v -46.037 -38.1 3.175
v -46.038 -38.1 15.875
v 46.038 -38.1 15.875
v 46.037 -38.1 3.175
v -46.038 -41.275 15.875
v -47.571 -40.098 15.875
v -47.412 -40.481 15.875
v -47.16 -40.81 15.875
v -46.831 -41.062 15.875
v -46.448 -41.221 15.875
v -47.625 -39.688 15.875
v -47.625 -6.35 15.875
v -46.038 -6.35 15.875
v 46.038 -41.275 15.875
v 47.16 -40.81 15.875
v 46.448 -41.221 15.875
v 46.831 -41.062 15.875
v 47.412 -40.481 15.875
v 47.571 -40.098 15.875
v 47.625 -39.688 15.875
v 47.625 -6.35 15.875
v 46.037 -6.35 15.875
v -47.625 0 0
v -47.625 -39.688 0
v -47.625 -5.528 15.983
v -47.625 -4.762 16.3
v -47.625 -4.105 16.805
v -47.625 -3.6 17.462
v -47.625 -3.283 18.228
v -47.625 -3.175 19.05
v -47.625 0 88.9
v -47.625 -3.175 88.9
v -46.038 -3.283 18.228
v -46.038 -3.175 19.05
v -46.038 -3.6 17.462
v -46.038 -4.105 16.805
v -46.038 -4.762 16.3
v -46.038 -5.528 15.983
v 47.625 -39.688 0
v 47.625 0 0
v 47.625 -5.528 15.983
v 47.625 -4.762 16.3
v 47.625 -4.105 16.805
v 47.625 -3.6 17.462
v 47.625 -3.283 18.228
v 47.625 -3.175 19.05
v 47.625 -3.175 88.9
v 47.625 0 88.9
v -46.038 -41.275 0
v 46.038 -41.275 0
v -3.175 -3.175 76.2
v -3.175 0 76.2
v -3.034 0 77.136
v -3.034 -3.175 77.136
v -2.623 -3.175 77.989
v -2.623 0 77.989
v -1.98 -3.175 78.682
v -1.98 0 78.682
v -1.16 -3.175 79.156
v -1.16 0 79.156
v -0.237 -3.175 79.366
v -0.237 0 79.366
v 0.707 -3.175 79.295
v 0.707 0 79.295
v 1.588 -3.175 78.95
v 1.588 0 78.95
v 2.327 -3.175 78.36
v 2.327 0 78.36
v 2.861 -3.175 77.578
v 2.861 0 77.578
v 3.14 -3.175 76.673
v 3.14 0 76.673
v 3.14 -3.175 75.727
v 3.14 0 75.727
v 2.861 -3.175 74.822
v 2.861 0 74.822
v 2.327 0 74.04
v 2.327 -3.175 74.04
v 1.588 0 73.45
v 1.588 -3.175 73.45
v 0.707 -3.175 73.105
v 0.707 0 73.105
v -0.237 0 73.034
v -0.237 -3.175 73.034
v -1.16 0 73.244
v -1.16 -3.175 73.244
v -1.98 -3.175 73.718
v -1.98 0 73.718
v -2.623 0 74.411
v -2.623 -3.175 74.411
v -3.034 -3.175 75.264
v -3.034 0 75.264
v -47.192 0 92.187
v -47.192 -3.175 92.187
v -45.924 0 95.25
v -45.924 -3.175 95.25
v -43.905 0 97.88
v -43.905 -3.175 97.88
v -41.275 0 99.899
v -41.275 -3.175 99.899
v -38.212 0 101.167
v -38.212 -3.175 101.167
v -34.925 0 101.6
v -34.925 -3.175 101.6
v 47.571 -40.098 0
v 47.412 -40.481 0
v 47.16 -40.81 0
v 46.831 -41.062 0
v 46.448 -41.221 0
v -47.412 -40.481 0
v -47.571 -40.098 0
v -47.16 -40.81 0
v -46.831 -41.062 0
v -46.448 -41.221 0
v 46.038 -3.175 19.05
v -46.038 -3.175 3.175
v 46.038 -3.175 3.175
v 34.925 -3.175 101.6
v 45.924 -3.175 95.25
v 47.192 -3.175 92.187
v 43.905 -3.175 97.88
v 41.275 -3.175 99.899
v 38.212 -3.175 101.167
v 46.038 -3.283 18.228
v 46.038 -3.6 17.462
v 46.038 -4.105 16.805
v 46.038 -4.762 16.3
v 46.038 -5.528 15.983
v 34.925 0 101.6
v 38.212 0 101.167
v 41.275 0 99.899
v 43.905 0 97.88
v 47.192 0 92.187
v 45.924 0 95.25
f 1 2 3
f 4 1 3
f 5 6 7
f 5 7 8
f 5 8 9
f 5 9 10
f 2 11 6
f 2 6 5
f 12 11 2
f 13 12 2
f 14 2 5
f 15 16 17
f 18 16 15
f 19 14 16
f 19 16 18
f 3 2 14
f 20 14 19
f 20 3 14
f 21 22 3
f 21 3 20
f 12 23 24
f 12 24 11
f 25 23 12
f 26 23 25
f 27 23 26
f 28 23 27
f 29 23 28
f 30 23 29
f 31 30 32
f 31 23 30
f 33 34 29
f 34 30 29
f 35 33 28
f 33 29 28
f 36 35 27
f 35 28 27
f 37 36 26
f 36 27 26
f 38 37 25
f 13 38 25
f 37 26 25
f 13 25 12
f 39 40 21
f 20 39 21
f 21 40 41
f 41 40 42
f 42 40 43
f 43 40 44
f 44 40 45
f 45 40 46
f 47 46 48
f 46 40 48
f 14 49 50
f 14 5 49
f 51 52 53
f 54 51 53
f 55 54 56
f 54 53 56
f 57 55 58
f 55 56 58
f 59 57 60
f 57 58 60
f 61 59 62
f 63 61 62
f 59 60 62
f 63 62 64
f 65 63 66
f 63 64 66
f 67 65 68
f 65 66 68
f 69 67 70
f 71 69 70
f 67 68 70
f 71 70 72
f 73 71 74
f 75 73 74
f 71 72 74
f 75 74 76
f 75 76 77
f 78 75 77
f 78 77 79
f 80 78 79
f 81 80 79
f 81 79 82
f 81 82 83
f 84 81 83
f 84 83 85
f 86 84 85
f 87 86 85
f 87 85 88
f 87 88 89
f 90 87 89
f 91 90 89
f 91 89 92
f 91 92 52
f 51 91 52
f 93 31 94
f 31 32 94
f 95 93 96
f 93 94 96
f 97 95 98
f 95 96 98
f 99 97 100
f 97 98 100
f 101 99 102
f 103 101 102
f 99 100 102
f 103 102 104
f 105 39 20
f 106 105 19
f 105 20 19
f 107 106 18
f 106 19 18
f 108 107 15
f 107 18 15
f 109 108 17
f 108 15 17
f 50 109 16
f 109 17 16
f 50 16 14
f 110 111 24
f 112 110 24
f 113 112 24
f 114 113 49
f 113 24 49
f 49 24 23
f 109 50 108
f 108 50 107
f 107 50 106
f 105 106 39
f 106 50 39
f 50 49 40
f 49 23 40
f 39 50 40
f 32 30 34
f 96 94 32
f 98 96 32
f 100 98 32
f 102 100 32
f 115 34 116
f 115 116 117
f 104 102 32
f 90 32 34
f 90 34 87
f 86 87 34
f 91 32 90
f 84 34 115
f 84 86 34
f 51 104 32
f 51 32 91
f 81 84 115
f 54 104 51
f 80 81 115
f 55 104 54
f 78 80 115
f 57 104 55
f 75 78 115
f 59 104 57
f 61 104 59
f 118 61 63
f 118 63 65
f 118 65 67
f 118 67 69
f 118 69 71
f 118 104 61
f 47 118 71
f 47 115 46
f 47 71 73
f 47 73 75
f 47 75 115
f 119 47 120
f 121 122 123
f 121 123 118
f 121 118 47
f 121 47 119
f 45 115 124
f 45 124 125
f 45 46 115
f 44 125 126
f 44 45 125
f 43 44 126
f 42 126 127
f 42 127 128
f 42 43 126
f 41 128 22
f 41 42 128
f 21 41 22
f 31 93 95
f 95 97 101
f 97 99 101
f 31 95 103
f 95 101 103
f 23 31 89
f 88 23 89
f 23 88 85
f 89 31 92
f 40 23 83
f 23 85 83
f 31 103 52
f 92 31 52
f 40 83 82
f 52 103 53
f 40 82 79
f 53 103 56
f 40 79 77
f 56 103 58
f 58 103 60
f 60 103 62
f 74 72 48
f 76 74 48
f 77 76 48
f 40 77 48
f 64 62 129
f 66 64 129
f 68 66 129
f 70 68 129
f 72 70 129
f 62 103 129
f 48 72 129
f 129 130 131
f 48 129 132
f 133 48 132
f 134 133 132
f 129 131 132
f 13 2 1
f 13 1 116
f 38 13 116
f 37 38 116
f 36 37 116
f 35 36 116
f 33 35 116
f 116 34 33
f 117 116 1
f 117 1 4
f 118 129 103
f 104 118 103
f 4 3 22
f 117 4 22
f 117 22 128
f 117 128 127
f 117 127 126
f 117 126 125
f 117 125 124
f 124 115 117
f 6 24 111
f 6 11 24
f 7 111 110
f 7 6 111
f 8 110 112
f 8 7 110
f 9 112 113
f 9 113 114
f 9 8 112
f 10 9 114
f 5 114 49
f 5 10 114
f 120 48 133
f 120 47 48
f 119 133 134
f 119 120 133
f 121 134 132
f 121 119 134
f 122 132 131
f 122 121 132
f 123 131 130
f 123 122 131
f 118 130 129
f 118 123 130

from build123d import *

# Parameters (mm, degrees)
F1_DEPTH = 3.175
F3_DEPTH = 3.175
F4_W     = 38.1
F4_H     = 15.875
F5_DEPTH = 1.5875
F7_W     = 95.25
F7_H     = 15.875
F8_DEPTH = 3.175
F9_R     = 12.7
F11_D    = 6.35
F12_R    = 3.175
F13_R    = 1.5875


with BuildPart() as f1:
    # F0 (on Front) → F1 (new body)
    with BuildSketch(Plane.XZ):
        Polygon((-47.625, 0), (0, 0), (47.625, 0), (47.625, 101.6), (0, 101.6), (-47.625, 101.6), align=None)
    extrude(amount=F1_DEPTH)

    # F2 (on Top) → F3 (join)
    with BuildSketch(Plane.XY):
        Polygon((47.625, 0), (0, 0), (-47.625, 0), (-47.625, -38.1), (0, -38.1), (47.625, -38.1), align=None)
    extrude(amount=F3_DEPTH)

    # F4 (on face) → F5 (join)
    with BuildSketch(Plane.YZ.offset(47.625)):
        with Locations((-19.05, 7.9375)):
            Rectangle(F4_W, F4_H)
    extrude(amount=-F5_DEPTH)

    # F6: F1 across plane


with BuildPart() as f1_1:
    add(f1.part)
    add(f1.part.mirror(Plane.YZ))

    # F7 (on face) → F8 (join)
    with BuildSketch(Plane.XZ.offset(38.1)):
        with Locations((0, 7.9375)):
            Rectangle(F7_W, F7_H)
    extrude(amount=F8_DEPTH)

    # F9
    f9_edges = [f1_1.edges().sort_by_distance(p)[0] for p in [
        (47.625, -1.5875, 101.6),
        (-47.625, -1.5875, 101.6),
    ]]
    fillet(f9_edges, radius=F9_R)

    # F11 (through all)
    with Locations(Plane.XZ.offset(3.175)):
        with Locations((0, 76.2)):
            Hole(F11_D / 2)

    # F12
    f12_edges = [f1_1.edges().sort_by_distance(p)[0] for p in [
        (-46.83125, -3.175, 15.875),
        (46.83125, -3.175, 15.875),
    ]]
    fillet(f12_edges, radius=F12_R)

    # F13
    f13_edges = [f1_1.edges().sort_by_distance(p)[0] for p in [
        (-47.625, -41.275, 7.9375),
        (47.625, -41.275, 7.9375),
    ]]
    fillet(f13_edges, radius=F13_R)


solid = f1_1.part
